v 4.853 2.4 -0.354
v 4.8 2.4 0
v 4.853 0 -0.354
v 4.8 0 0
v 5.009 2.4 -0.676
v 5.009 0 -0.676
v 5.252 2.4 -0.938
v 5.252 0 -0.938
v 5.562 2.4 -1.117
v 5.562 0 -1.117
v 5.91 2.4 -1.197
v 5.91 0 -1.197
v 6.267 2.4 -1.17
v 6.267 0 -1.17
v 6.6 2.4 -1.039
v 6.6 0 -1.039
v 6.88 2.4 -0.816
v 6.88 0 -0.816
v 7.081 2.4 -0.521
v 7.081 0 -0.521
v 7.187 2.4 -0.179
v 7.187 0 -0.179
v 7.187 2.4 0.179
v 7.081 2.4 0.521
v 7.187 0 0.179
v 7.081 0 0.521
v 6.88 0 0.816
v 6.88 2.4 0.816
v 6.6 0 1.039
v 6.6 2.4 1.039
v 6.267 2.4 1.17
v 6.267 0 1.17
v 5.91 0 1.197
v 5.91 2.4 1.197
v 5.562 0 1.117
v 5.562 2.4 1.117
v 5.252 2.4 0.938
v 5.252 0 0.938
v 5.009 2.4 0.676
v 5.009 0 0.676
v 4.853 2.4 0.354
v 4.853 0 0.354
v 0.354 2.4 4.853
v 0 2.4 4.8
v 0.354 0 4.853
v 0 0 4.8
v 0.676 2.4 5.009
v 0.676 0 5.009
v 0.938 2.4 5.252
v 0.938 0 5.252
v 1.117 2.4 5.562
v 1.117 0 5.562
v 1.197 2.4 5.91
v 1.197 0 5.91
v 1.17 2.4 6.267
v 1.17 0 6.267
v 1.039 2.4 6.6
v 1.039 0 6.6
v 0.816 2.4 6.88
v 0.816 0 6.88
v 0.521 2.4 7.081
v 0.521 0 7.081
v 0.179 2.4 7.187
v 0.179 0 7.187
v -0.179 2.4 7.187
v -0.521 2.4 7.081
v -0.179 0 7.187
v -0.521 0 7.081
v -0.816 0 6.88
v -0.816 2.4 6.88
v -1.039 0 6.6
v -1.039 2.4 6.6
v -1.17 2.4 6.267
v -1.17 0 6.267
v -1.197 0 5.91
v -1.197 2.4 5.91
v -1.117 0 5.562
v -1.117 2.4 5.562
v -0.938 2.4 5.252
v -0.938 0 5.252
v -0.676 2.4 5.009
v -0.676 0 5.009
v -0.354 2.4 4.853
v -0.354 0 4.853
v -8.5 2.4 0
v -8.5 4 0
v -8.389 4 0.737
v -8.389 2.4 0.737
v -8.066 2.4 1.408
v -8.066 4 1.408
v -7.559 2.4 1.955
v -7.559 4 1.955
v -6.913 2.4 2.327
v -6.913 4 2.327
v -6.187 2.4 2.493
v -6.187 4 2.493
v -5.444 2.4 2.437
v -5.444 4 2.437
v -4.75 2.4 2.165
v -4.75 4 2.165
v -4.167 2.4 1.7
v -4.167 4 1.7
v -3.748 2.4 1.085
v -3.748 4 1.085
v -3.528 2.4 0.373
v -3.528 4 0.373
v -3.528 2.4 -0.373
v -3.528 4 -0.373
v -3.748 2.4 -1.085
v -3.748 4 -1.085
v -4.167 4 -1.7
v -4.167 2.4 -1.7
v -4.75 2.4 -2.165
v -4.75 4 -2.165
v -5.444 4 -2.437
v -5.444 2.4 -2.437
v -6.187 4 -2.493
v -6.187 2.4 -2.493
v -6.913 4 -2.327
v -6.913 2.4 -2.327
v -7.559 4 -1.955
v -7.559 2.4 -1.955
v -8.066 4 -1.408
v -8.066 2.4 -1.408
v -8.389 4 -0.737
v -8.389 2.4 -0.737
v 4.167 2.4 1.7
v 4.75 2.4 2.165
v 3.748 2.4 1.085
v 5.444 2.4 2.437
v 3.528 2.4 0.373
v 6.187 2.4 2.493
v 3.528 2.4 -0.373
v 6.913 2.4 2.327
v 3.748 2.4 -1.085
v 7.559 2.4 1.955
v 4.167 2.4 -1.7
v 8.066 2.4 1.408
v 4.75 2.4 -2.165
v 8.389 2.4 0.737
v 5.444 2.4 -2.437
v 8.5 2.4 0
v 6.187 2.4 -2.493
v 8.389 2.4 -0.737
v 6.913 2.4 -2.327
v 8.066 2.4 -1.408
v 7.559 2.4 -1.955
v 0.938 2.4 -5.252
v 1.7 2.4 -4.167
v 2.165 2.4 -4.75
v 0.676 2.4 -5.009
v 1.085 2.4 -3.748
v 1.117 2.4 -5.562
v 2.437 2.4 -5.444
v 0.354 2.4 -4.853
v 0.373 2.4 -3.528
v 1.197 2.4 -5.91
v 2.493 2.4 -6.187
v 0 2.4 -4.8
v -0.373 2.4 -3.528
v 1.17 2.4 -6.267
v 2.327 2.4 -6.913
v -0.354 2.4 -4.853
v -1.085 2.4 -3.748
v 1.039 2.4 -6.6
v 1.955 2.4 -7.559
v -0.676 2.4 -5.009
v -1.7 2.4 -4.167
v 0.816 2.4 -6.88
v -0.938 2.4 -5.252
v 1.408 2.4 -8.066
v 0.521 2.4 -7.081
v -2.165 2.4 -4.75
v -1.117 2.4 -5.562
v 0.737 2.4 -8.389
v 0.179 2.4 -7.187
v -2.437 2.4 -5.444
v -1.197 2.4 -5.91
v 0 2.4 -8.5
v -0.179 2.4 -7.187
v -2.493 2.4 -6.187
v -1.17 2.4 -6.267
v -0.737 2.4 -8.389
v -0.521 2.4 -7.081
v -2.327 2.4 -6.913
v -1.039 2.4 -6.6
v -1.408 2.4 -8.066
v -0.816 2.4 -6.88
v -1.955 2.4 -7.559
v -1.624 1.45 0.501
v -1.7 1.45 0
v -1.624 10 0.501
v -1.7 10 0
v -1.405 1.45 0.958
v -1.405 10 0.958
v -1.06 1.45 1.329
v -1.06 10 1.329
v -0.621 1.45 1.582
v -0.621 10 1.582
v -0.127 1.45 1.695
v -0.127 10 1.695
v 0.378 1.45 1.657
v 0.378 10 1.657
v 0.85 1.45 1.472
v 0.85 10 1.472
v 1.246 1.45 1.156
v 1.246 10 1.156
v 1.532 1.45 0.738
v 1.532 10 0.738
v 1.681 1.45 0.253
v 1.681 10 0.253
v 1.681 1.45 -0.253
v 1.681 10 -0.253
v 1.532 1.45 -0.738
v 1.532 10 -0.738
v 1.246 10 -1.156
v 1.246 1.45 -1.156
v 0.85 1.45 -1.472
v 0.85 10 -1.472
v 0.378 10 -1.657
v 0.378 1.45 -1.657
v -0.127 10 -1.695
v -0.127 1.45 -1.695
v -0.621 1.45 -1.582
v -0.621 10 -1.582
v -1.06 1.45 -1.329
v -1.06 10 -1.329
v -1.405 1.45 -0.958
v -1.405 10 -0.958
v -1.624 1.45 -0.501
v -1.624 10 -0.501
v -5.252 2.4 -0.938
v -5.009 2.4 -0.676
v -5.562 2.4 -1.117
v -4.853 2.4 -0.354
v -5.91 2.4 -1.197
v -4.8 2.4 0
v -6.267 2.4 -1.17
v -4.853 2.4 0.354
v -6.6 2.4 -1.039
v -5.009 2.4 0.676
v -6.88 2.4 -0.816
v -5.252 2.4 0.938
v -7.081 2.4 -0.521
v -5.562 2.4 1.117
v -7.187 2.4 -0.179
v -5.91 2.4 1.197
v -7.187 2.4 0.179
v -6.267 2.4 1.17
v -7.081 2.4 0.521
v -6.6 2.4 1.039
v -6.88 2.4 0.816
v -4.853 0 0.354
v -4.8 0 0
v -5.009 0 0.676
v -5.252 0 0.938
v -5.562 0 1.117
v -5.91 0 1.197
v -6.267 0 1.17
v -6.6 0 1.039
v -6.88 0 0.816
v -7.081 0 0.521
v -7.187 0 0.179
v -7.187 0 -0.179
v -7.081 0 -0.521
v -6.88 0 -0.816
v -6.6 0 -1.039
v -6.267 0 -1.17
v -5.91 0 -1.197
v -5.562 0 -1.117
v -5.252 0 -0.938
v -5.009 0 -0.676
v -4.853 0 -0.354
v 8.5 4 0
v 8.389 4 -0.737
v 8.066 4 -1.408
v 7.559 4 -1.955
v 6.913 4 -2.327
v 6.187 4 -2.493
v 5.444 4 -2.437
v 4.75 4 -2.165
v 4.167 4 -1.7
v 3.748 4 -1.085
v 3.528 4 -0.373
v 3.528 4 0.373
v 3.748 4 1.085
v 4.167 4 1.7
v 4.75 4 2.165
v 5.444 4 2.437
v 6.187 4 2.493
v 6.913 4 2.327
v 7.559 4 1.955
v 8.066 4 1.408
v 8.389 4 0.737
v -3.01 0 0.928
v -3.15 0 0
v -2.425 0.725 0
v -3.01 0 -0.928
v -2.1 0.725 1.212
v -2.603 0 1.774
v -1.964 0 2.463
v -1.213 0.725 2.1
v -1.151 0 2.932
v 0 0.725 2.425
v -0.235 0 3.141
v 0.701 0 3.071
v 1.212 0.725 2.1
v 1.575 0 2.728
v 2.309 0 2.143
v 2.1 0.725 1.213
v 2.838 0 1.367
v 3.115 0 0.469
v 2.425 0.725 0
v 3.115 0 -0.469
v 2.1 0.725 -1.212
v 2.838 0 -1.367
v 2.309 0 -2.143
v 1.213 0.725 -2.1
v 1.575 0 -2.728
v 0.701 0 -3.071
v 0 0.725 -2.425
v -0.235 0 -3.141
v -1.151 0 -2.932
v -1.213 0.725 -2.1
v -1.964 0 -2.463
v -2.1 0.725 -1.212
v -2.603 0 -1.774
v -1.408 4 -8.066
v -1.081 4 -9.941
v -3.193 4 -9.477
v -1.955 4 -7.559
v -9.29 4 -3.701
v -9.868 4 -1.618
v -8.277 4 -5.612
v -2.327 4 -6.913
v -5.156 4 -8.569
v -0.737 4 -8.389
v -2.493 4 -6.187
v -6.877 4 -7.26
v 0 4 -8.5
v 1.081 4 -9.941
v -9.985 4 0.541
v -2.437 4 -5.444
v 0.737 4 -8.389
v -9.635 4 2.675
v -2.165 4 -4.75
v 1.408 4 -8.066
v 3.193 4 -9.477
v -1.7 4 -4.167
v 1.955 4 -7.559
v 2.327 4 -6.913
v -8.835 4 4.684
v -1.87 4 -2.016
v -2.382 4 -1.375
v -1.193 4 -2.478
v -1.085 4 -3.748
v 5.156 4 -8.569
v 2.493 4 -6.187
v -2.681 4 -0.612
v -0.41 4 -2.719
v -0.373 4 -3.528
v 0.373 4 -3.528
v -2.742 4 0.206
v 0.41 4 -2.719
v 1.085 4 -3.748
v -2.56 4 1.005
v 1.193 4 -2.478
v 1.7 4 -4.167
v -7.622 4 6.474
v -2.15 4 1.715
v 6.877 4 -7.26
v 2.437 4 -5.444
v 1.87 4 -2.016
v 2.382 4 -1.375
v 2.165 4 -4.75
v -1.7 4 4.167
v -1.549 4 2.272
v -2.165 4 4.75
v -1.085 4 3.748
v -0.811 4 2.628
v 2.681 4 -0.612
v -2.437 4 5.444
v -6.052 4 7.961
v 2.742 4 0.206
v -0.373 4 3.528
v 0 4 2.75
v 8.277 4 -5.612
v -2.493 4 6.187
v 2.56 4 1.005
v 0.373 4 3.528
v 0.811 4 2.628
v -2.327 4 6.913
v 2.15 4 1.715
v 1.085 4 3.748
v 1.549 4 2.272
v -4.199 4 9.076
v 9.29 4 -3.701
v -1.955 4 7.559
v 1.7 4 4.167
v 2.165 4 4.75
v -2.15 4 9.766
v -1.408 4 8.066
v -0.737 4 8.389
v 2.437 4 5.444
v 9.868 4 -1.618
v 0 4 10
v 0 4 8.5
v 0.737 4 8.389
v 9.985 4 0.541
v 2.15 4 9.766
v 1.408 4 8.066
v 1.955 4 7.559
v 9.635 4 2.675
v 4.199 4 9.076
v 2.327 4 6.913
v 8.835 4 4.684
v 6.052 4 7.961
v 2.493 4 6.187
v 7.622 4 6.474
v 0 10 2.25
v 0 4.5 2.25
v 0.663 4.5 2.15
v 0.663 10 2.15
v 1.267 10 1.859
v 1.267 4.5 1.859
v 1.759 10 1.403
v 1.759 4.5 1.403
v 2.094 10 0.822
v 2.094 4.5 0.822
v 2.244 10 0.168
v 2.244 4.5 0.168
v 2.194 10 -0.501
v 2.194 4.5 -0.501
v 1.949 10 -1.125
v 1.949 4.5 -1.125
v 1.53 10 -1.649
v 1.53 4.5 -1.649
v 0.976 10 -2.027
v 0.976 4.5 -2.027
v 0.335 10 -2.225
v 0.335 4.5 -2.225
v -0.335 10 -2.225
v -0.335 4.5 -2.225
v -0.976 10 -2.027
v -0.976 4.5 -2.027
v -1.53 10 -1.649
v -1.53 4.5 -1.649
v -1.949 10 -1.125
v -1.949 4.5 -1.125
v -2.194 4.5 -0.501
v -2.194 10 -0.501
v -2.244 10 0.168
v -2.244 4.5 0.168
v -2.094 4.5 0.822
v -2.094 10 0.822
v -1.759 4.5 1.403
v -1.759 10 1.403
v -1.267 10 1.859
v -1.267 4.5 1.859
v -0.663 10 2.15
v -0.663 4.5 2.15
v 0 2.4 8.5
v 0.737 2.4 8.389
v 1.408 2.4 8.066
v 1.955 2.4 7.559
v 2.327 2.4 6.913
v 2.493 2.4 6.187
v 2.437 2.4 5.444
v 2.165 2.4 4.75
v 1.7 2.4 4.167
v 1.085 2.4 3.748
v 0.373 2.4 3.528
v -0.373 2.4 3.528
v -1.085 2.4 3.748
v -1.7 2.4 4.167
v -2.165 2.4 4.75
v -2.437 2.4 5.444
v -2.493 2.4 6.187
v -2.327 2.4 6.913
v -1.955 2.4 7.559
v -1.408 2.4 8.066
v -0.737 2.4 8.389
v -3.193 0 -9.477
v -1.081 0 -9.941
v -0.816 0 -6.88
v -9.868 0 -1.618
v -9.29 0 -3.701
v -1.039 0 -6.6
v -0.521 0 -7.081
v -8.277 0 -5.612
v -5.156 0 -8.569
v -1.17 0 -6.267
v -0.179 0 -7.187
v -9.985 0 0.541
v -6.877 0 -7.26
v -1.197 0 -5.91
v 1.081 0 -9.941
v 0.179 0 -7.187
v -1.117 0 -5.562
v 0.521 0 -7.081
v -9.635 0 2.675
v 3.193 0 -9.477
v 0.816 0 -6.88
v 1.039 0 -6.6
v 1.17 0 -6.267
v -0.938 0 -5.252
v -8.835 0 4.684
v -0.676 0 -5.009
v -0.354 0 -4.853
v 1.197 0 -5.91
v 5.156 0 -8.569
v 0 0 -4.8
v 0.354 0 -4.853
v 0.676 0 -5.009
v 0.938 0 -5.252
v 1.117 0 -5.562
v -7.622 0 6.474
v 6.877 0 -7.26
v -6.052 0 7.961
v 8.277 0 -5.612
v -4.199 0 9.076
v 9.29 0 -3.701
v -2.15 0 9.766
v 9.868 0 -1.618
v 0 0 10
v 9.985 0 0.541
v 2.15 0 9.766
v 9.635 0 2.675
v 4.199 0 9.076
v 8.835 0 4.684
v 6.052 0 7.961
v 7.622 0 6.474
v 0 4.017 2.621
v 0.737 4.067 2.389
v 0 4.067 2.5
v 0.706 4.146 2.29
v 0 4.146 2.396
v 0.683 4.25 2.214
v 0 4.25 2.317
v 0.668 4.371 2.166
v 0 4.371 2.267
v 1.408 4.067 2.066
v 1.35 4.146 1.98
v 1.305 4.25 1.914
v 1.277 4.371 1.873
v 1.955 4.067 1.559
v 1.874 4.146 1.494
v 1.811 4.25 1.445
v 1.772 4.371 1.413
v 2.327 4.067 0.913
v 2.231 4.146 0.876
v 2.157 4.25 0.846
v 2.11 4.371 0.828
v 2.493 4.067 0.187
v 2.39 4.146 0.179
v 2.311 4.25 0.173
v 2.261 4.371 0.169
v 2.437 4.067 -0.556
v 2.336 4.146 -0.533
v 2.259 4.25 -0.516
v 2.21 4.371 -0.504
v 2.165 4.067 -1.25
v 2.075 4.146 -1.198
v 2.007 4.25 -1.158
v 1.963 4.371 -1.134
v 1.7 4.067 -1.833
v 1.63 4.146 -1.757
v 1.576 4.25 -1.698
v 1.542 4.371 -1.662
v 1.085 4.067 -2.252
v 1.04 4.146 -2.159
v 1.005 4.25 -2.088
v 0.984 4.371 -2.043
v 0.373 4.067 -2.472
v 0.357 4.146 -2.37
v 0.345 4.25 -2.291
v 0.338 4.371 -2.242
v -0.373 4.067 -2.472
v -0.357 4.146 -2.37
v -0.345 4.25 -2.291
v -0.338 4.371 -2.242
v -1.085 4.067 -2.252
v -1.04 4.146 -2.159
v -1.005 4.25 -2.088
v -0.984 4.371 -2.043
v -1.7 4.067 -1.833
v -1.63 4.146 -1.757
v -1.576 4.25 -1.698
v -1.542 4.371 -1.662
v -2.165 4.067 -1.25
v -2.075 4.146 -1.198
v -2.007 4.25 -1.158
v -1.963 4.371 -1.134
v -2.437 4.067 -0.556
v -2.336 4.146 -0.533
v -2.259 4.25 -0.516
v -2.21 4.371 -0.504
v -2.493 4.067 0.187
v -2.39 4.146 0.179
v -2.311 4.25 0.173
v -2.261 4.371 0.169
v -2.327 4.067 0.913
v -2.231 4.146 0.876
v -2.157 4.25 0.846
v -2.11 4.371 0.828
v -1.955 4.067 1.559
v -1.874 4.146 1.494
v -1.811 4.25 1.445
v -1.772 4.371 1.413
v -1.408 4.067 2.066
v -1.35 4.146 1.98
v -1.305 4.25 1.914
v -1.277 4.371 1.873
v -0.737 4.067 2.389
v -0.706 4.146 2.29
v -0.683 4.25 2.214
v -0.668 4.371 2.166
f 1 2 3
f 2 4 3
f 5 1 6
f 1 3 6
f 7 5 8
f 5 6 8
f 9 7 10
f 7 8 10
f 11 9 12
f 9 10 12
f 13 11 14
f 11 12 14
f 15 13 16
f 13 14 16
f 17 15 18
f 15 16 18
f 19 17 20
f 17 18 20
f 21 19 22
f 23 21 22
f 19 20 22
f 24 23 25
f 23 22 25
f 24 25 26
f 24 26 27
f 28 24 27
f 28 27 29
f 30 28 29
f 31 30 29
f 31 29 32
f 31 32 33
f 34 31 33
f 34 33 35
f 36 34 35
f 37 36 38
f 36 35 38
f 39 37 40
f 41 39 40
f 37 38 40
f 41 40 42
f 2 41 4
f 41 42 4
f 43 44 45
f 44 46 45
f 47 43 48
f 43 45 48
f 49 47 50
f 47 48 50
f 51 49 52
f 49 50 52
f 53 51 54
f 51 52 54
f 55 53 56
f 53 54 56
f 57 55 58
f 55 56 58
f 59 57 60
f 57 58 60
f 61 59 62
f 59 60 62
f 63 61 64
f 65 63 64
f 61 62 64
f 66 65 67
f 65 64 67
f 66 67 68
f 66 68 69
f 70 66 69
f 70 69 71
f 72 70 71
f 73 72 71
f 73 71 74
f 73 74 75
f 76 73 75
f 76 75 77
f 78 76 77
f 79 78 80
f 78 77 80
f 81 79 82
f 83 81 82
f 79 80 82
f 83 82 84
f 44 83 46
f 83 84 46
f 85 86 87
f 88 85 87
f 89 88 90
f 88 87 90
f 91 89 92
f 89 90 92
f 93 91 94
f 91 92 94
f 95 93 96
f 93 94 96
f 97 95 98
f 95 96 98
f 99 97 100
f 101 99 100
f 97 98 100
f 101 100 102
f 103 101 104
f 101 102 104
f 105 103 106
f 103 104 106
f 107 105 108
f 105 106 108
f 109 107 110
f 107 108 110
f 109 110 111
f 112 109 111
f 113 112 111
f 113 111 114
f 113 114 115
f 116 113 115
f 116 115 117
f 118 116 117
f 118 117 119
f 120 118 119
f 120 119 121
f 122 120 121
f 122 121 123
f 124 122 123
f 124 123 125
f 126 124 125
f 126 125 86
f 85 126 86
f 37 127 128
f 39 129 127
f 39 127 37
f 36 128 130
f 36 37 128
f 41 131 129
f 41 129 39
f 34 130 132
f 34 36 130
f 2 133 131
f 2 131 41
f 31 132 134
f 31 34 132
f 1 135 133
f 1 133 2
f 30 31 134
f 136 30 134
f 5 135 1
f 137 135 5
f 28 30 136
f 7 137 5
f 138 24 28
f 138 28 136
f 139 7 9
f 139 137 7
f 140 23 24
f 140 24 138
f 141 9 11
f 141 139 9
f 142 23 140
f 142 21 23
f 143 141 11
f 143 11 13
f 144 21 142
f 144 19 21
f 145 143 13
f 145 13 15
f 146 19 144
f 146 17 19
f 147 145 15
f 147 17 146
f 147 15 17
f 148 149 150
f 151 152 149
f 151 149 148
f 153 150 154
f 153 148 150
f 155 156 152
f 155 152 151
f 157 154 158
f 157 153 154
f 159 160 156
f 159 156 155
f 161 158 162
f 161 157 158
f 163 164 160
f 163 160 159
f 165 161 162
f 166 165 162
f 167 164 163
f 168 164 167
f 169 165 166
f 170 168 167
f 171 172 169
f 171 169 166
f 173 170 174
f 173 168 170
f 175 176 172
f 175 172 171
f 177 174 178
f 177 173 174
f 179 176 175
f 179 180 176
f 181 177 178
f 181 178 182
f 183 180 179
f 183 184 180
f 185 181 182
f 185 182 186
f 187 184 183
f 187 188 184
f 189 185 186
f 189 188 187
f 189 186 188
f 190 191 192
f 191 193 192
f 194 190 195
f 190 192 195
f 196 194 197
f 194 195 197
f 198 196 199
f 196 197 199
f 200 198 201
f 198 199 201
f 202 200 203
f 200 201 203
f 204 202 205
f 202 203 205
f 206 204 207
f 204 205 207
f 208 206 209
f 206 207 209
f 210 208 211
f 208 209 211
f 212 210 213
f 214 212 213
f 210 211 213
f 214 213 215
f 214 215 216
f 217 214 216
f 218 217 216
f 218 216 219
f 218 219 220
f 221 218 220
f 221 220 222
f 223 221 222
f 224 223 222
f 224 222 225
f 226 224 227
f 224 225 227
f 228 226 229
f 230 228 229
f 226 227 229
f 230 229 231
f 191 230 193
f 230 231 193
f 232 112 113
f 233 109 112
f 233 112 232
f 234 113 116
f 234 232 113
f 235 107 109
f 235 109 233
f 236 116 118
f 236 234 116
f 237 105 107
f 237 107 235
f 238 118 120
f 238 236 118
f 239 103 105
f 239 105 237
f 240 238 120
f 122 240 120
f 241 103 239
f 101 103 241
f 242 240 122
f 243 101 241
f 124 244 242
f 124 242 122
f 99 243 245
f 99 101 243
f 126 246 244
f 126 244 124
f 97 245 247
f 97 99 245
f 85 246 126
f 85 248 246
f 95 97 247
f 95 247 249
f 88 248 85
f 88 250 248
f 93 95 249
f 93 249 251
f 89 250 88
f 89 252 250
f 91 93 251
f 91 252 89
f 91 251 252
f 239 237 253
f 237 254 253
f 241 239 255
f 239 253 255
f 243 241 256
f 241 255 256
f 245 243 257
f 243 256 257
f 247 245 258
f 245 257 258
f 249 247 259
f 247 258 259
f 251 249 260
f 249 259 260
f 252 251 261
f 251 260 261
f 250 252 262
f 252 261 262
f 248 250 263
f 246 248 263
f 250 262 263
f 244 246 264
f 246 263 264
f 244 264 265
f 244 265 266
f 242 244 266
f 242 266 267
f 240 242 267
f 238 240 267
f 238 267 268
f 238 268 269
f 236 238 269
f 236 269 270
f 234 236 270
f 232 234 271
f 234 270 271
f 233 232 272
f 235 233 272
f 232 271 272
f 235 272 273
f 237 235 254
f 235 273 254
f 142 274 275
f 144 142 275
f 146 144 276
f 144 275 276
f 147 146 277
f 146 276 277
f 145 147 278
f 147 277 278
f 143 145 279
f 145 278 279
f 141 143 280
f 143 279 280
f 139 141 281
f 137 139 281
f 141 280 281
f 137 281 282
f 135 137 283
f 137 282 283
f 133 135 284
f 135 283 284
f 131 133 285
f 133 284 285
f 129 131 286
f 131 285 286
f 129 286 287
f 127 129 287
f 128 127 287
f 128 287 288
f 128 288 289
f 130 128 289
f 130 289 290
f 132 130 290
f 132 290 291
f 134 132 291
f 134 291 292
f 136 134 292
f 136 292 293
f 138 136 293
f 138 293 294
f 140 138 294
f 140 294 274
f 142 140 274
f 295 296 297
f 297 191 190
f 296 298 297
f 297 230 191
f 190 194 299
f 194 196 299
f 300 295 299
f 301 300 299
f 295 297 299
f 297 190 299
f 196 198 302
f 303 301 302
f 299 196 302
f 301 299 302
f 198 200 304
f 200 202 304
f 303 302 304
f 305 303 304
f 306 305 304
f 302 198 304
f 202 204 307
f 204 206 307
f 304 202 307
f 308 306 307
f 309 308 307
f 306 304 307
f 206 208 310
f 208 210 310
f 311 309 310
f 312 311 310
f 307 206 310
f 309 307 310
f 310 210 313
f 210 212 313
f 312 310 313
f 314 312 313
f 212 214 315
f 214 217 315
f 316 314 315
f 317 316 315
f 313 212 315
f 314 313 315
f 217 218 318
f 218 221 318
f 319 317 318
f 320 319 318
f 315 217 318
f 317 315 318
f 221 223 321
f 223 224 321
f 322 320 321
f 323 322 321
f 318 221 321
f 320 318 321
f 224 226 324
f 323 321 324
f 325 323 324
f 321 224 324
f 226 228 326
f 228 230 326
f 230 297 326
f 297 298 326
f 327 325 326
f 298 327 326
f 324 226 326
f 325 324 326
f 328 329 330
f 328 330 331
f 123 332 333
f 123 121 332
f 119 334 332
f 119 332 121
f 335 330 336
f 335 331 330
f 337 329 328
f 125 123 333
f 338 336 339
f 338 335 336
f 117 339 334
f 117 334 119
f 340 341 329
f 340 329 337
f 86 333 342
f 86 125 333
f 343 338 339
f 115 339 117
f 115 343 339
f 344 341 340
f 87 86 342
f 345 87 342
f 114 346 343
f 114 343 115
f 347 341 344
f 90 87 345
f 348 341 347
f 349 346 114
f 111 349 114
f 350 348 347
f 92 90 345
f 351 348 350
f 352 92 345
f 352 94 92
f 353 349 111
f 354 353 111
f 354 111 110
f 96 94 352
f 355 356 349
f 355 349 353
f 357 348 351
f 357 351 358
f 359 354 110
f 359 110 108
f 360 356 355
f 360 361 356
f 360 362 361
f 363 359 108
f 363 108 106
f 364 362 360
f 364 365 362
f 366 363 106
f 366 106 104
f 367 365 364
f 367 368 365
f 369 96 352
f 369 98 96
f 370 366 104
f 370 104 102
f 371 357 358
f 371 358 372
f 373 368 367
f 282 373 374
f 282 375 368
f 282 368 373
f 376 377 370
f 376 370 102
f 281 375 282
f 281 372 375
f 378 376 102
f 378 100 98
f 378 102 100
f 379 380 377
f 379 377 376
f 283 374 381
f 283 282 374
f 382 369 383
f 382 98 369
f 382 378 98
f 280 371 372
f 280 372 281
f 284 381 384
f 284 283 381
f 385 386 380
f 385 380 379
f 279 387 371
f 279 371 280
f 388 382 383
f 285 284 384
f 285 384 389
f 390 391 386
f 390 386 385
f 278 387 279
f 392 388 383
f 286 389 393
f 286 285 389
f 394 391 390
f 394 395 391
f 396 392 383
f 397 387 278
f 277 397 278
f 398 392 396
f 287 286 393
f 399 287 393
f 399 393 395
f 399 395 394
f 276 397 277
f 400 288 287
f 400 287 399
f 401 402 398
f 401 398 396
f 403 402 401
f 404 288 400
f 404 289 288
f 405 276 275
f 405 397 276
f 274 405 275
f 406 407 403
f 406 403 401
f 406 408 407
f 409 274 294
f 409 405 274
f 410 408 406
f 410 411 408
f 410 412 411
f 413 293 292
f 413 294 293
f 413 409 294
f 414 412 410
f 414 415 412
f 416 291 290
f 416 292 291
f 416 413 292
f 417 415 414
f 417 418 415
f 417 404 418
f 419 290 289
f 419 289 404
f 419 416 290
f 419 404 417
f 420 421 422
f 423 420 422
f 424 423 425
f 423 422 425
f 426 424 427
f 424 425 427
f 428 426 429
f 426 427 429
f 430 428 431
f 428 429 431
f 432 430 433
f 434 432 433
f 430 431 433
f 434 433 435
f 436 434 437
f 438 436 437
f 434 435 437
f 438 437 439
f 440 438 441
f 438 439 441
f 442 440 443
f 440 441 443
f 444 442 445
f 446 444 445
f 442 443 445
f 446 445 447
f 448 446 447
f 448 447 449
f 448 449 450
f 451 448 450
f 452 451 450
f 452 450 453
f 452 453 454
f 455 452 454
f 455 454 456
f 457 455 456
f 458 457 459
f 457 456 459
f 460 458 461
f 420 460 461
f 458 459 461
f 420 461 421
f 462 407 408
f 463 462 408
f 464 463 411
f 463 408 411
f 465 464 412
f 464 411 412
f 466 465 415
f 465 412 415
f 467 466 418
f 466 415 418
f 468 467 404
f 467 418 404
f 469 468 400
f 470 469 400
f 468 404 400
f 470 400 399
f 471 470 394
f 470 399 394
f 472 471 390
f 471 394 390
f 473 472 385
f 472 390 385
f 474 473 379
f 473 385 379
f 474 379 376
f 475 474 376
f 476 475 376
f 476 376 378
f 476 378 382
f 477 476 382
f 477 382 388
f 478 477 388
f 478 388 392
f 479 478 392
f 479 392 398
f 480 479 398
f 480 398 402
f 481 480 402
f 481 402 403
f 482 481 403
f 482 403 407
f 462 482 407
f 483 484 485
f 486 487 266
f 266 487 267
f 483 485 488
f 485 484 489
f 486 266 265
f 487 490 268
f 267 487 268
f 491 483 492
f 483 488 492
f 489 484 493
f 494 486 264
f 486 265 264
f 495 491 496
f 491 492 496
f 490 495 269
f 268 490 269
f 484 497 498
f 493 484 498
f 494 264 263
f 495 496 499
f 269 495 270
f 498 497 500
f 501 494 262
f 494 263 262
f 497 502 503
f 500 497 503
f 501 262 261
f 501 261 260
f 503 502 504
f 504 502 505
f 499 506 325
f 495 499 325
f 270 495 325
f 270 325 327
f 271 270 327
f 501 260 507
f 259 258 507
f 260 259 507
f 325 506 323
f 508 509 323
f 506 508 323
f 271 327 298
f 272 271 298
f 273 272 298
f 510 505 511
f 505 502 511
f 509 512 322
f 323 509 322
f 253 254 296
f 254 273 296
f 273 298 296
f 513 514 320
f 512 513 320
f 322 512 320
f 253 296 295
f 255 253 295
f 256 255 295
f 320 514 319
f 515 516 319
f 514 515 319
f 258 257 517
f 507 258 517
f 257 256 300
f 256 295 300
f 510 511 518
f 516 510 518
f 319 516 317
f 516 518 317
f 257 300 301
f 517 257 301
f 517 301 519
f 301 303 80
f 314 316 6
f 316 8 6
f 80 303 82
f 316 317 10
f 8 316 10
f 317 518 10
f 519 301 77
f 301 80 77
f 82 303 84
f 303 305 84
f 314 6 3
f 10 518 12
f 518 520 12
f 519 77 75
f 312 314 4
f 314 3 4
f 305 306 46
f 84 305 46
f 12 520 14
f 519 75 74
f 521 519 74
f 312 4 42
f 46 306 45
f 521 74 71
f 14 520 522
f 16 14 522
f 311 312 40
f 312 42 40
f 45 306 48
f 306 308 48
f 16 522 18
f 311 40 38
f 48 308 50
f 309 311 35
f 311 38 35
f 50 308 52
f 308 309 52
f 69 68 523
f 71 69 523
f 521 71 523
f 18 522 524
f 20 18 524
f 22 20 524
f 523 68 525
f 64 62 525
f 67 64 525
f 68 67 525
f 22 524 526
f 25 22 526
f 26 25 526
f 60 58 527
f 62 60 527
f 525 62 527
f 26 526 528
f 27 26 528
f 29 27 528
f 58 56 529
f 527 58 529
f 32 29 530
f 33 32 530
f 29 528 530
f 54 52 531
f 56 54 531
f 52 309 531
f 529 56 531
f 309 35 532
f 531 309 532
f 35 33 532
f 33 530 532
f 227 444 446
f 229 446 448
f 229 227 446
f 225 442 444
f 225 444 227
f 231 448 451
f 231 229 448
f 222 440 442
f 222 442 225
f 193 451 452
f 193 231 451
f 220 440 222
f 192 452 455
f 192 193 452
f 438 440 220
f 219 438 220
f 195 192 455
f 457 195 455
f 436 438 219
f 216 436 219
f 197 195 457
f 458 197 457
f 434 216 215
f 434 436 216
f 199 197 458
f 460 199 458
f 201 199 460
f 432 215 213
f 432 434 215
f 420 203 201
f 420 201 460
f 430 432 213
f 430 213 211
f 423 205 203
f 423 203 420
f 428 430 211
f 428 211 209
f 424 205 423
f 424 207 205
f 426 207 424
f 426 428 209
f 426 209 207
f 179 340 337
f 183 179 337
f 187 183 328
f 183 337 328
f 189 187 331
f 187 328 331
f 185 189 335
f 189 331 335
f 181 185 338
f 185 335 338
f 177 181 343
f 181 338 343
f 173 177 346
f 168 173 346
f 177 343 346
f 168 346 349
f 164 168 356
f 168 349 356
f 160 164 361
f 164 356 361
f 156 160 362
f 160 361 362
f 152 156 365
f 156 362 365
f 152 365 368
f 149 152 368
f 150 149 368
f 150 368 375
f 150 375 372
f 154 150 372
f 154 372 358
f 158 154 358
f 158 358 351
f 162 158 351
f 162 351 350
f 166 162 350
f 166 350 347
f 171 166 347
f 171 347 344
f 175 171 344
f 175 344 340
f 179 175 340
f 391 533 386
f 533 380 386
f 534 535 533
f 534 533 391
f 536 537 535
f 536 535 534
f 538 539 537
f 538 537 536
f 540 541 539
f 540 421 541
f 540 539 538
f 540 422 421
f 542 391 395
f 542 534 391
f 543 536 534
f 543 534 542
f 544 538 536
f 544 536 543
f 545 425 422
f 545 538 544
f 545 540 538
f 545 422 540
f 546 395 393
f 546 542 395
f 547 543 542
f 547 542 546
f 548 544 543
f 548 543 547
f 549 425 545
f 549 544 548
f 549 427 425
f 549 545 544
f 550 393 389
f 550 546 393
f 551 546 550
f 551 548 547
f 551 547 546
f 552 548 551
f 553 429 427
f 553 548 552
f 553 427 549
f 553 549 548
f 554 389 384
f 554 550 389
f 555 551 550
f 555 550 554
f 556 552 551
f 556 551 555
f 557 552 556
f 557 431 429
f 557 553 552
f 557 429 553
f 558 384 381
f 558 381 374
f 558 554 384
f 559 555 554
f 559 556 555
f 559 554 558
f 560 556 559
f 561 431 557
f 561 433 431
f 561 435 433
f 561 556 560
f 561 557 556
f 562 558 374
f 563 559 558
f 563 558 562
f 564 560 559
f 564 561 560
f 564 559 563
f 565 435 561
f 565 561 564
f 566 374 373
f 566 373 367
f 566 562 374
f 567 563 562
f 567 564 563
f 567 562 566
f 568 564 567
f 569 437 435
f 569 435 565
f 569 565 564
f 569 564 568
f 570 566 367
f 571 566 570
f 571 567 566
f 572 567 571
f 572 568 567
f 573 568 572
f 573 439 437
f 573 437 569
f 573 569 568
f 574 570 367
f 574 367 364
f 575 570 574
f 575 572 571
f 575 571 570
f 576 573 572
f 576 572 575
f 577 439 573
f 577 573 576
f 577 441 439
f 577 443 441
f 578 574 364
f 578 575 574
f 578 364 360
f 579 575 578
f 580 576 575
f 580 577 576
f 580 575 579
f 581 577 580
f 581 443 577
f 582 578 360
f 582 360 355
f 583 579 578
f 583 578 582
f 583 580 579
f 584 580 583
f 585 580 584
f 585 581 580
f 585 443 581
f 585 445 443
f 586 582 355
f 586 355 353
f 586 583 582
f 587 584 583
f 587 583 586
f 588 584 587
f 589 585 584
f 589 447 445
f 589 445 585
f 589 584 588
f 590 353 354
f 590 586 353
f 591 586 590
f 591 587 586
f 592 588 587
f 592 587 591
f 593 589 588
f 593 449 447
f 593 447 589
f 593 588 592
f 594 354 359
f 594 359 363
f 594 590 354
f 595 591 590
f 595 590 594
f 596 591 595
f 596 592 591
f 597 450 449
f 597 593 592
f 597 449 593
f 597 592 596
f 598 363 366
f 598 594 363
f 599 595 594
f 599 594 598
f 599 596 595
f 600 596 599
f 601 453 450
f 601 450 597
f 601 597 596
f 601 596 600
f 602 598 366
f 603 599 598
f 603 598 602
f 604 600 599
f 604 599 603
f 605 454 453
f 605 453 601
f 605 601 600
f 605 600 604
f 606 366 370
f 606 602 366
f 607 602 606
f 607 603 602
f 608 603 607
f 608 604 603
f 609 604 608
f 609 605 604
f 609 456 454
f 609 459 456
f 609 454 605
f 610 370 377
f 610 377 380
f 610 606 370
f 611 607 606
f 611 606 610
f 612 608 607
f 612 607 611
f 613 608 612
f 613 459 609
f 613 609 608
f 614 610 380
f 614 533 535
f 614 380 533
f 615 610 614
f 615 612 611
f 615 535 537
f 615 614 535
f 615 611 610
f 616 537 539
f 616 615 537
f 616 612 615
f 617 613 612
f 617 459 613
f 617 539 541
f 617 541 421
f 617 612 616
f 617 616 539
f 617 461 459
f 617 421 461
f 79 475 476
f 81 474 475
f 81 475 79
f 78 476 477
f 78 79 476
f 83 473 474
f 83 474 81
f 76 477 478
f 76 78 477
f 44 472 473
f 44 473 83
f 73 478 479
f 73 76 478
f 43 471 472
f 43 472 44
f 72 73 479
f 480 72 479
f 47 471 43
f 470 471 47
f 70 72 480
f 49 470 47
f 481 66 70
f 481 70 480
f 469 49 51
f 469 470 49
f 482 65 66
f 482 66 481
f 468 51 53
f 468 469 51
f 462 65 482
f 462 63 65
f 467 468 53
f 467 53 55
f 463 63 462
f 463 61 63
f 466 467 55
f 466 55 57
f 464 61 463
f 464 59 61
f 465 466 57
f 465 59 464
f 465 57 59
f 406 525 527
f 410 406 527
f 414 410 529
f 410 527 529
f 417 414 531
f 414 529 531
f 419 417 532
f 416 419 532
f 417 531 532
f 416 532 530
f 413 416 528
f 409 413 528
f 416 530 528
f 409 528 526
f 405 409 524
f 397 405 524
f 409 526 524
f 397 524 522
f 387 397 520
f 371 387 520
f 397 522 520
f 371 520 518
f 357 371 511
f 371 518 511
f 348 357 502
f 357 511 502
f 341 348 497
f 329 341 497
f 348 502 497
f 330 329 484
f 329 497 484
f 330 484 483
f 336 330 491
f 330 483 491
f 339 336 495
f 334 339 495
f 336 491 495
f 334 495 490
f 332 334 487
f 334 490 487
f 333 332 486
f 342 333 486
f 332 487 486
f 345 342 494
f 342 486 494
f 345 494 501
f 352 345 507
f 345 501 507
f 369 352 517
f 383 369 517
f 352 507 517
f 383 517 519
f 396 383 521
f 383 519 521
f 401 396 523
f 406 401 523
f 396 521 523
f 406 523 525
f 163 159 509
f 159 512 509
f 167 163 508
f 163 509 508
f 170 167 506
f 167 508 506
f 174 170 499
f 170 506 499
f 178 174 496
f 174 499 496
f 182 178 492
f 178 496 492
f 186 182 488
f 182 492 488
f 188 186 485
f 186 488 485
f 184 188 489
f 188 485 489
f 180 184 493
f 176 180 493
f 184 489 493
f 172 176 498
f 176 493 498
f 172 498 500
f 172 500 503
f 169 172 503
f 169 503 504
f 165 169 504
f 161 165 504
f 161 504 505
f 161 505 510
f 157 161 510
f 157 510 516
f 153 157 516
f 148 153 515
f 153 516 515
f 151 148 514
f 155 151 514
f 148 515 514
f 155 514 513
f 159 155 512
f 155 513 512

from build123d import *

# Parameters (mm, degrees)
SKETCH1_R                                           = 10
BOSS_EXTRUDE1_DEPTH                                 = 4
CBORE_FOR_M2_PAN_HEAD_SCREW1_D                      = 2.4
CBORE_FOR_M2_PAN_HEAD_SCREW1_CBORE_D                = 5
CBORE_FOR_M2_PAN_HEAD_SCREW1_CBORE_DEPTH            = 1.6
SKETCH4_R                                           = 2.25
BOSS_EXTRUDE2_DEPTH                                 = 6
CIRPATTERN1_COUNT                                   = 4
CSK_FOR_M3_COUNTERSUNK_FLAT_HEAD_SCREW1_D           = 3.4
CSK_FOR_M3_COUNTERSUNK_FLAT_HEAD_SCREW1_CSINK_D     = 6.3
CSK_FOR_M3_COUNTERSUNK_FLAT_HEAD_SCREW1_CSINK_ANGLE = 90
FILLET1_R                                           = 0.5


with BuildPart() as part:
    # Sketch1 → Boss-Extrude1 (new body)
    with BuildSketch(Plane(origin=(0, 0, 0), x_dir=(1, 0, 0), z_dir=(0, 1, 0))):
        with Locations(Location((0, 0, 0), (0, 0, 270))):
            Circle(SKETCH1_R)
    extrude(amount=BOSS_EXTRUDE1_DEPTH)

    # CBORE for M2 Pan Head Screw1 (through all)
    with Locations(Plane(origin=(0, 4, 0), x_dir=(1, 0, 0), z_dir=(0, 1, 0))):
        with Locations((6, 0)):
            cbore_for_m2_pan_head_screw1 = CounterBoreHole(CBORE_FOR_M2_PAN_HEAD_SCREW1_D / 2, CBORE_FOR_M2_PAN_HEAD_SCREW1_CBORE_D / 2, CBORE_FOR_M2_PAN_HEAD_SCREW1_CBORE_DEPTH)

    # Sketch4 → Boss-Extrude2 (add)
    with BuildSketch(Plane(origin=(0, 4, 0), x_dir=(1, 0, 0), z_dir=(0, 1, 0))):
        with Locations(Location((0, 0, 0), (0, 0, 270))):
            Circle(SKETCH4_R)
    extrude(amount=BOSS_EXTRUDE2_DEPTH)

    # CirPattern1: CBORE for M2 Pan Head Screw1 ×4 about axis
    cirpattern1_axis = Axis((0, 0, 0), (0, 1, 0))
    for i in range(1, CIRPATTERN1_COUNT):
        add(cbore_for_m2_pan_head_screw1.rotate(cirpattern1_axis, i * 360 / CIRPATTERN1_COUNT), mode=Mode.SUBTRACT)

    # CSK for M3 Countersunk Flat Head Screw1 (through all)
    with Locations(Plane.XZ):
        with Locations((0, 0)):
            CounterSinkHole(CSK_FOR_M3_COUNTERSUNK_FLAT_HEAD_SCREW1_D / 2, CSK_FOR_M3_COUNTERSUNK_FLAT_HEAD_SCREW1_CSINK_D / 2, counter_sink_angle=CSK_FOR_M3_COUNTERSUNK_FLAT_HEAD_SCREW1_CSINK_ANGLE)

    # Fillet1
    fillet1_edges = [part.edges().sort_by_distance(p)[0] for p in [
        (0, 4, -2.25),
    ]]
    fillet(fillet1_edges, radius=FILLET1_R)


solid = part.part
